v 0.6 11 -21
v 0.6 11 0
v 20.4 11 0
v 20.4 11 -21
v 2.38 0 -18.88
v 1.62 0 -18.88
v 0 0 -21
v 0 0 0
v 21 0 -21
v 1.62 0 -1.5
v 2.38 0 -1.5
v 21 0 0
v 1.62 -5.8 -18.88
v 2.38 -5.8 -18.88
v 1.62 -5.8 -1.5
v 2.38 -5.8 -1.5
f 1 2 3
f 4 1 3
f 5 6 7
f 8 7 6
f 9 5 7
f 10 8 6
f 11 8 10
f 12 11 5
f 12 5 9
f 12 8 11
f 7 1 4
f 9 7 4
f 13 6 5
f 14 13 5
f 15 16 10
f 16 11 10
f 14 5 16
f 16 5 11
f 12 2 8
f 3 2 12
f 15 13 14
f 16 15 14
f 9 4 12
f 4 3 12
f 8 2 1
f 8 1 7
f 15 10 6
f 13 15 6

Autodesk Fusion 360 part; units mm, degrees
sketch "Front View" plane through (0, 0, 0) normal (0, 0, 1) x (1, 0, 0)
  line L0 (0, 0) -> (21, 0)
  line L1 (0.6, 11) -> (20.4, 11)
  line L2 (0.6, 11) -> (0, 0)
  line L3 (20.4, 11) -> (21, 0)
  dimension "d1" = 21
  dimension "d2" = 19.8
  dimension "d3" = 11
extrude "Extrude1" add sketch "Front View" against normal blind 21
sketch "Pin Sketches" plane through (0, 0, 0) normal (0, -1, 0) x (1, 0, 0)
  line L0 (21, 0) -> (0, 0)
  line L1 (0, 0) -> (0, -21)
  line L2 (0, -21) -> (21, -21)
  line L3 (21, -21) -> (21, 0)
  line L4 (1.62, -18.88) -> (2.38, -18.88)
  line L5 (2.38, -18.88) -> (2.38, -18.12)
  line L6 (2.38, -18.12) -> (1.62, -18.12)
  line L7 (1.62, -18.12) -> (1.62, -18.88)
  line L8 (1.62, -18.88) -> (2.38, -18.88)
  line L9 (2.38, -18.88) -> (2.38, -1.5)
  line L10 (2.38, -1.5) -> (1.62, -1.5)
  line L11 (1.62, -1.5) -> (1.62, -18.88)
  dimension "d6" = 0.76
  dimension "d7" = 0.76
  dimension "d8" = 1.62
  dimension "d9" = 2.12
extrude "Extrude2" add sketch "Pin Sketches" along normal blind 5.8 contours L4 L5 L6 L7 L8 L9 L11 | L6 L9 L10 L11
